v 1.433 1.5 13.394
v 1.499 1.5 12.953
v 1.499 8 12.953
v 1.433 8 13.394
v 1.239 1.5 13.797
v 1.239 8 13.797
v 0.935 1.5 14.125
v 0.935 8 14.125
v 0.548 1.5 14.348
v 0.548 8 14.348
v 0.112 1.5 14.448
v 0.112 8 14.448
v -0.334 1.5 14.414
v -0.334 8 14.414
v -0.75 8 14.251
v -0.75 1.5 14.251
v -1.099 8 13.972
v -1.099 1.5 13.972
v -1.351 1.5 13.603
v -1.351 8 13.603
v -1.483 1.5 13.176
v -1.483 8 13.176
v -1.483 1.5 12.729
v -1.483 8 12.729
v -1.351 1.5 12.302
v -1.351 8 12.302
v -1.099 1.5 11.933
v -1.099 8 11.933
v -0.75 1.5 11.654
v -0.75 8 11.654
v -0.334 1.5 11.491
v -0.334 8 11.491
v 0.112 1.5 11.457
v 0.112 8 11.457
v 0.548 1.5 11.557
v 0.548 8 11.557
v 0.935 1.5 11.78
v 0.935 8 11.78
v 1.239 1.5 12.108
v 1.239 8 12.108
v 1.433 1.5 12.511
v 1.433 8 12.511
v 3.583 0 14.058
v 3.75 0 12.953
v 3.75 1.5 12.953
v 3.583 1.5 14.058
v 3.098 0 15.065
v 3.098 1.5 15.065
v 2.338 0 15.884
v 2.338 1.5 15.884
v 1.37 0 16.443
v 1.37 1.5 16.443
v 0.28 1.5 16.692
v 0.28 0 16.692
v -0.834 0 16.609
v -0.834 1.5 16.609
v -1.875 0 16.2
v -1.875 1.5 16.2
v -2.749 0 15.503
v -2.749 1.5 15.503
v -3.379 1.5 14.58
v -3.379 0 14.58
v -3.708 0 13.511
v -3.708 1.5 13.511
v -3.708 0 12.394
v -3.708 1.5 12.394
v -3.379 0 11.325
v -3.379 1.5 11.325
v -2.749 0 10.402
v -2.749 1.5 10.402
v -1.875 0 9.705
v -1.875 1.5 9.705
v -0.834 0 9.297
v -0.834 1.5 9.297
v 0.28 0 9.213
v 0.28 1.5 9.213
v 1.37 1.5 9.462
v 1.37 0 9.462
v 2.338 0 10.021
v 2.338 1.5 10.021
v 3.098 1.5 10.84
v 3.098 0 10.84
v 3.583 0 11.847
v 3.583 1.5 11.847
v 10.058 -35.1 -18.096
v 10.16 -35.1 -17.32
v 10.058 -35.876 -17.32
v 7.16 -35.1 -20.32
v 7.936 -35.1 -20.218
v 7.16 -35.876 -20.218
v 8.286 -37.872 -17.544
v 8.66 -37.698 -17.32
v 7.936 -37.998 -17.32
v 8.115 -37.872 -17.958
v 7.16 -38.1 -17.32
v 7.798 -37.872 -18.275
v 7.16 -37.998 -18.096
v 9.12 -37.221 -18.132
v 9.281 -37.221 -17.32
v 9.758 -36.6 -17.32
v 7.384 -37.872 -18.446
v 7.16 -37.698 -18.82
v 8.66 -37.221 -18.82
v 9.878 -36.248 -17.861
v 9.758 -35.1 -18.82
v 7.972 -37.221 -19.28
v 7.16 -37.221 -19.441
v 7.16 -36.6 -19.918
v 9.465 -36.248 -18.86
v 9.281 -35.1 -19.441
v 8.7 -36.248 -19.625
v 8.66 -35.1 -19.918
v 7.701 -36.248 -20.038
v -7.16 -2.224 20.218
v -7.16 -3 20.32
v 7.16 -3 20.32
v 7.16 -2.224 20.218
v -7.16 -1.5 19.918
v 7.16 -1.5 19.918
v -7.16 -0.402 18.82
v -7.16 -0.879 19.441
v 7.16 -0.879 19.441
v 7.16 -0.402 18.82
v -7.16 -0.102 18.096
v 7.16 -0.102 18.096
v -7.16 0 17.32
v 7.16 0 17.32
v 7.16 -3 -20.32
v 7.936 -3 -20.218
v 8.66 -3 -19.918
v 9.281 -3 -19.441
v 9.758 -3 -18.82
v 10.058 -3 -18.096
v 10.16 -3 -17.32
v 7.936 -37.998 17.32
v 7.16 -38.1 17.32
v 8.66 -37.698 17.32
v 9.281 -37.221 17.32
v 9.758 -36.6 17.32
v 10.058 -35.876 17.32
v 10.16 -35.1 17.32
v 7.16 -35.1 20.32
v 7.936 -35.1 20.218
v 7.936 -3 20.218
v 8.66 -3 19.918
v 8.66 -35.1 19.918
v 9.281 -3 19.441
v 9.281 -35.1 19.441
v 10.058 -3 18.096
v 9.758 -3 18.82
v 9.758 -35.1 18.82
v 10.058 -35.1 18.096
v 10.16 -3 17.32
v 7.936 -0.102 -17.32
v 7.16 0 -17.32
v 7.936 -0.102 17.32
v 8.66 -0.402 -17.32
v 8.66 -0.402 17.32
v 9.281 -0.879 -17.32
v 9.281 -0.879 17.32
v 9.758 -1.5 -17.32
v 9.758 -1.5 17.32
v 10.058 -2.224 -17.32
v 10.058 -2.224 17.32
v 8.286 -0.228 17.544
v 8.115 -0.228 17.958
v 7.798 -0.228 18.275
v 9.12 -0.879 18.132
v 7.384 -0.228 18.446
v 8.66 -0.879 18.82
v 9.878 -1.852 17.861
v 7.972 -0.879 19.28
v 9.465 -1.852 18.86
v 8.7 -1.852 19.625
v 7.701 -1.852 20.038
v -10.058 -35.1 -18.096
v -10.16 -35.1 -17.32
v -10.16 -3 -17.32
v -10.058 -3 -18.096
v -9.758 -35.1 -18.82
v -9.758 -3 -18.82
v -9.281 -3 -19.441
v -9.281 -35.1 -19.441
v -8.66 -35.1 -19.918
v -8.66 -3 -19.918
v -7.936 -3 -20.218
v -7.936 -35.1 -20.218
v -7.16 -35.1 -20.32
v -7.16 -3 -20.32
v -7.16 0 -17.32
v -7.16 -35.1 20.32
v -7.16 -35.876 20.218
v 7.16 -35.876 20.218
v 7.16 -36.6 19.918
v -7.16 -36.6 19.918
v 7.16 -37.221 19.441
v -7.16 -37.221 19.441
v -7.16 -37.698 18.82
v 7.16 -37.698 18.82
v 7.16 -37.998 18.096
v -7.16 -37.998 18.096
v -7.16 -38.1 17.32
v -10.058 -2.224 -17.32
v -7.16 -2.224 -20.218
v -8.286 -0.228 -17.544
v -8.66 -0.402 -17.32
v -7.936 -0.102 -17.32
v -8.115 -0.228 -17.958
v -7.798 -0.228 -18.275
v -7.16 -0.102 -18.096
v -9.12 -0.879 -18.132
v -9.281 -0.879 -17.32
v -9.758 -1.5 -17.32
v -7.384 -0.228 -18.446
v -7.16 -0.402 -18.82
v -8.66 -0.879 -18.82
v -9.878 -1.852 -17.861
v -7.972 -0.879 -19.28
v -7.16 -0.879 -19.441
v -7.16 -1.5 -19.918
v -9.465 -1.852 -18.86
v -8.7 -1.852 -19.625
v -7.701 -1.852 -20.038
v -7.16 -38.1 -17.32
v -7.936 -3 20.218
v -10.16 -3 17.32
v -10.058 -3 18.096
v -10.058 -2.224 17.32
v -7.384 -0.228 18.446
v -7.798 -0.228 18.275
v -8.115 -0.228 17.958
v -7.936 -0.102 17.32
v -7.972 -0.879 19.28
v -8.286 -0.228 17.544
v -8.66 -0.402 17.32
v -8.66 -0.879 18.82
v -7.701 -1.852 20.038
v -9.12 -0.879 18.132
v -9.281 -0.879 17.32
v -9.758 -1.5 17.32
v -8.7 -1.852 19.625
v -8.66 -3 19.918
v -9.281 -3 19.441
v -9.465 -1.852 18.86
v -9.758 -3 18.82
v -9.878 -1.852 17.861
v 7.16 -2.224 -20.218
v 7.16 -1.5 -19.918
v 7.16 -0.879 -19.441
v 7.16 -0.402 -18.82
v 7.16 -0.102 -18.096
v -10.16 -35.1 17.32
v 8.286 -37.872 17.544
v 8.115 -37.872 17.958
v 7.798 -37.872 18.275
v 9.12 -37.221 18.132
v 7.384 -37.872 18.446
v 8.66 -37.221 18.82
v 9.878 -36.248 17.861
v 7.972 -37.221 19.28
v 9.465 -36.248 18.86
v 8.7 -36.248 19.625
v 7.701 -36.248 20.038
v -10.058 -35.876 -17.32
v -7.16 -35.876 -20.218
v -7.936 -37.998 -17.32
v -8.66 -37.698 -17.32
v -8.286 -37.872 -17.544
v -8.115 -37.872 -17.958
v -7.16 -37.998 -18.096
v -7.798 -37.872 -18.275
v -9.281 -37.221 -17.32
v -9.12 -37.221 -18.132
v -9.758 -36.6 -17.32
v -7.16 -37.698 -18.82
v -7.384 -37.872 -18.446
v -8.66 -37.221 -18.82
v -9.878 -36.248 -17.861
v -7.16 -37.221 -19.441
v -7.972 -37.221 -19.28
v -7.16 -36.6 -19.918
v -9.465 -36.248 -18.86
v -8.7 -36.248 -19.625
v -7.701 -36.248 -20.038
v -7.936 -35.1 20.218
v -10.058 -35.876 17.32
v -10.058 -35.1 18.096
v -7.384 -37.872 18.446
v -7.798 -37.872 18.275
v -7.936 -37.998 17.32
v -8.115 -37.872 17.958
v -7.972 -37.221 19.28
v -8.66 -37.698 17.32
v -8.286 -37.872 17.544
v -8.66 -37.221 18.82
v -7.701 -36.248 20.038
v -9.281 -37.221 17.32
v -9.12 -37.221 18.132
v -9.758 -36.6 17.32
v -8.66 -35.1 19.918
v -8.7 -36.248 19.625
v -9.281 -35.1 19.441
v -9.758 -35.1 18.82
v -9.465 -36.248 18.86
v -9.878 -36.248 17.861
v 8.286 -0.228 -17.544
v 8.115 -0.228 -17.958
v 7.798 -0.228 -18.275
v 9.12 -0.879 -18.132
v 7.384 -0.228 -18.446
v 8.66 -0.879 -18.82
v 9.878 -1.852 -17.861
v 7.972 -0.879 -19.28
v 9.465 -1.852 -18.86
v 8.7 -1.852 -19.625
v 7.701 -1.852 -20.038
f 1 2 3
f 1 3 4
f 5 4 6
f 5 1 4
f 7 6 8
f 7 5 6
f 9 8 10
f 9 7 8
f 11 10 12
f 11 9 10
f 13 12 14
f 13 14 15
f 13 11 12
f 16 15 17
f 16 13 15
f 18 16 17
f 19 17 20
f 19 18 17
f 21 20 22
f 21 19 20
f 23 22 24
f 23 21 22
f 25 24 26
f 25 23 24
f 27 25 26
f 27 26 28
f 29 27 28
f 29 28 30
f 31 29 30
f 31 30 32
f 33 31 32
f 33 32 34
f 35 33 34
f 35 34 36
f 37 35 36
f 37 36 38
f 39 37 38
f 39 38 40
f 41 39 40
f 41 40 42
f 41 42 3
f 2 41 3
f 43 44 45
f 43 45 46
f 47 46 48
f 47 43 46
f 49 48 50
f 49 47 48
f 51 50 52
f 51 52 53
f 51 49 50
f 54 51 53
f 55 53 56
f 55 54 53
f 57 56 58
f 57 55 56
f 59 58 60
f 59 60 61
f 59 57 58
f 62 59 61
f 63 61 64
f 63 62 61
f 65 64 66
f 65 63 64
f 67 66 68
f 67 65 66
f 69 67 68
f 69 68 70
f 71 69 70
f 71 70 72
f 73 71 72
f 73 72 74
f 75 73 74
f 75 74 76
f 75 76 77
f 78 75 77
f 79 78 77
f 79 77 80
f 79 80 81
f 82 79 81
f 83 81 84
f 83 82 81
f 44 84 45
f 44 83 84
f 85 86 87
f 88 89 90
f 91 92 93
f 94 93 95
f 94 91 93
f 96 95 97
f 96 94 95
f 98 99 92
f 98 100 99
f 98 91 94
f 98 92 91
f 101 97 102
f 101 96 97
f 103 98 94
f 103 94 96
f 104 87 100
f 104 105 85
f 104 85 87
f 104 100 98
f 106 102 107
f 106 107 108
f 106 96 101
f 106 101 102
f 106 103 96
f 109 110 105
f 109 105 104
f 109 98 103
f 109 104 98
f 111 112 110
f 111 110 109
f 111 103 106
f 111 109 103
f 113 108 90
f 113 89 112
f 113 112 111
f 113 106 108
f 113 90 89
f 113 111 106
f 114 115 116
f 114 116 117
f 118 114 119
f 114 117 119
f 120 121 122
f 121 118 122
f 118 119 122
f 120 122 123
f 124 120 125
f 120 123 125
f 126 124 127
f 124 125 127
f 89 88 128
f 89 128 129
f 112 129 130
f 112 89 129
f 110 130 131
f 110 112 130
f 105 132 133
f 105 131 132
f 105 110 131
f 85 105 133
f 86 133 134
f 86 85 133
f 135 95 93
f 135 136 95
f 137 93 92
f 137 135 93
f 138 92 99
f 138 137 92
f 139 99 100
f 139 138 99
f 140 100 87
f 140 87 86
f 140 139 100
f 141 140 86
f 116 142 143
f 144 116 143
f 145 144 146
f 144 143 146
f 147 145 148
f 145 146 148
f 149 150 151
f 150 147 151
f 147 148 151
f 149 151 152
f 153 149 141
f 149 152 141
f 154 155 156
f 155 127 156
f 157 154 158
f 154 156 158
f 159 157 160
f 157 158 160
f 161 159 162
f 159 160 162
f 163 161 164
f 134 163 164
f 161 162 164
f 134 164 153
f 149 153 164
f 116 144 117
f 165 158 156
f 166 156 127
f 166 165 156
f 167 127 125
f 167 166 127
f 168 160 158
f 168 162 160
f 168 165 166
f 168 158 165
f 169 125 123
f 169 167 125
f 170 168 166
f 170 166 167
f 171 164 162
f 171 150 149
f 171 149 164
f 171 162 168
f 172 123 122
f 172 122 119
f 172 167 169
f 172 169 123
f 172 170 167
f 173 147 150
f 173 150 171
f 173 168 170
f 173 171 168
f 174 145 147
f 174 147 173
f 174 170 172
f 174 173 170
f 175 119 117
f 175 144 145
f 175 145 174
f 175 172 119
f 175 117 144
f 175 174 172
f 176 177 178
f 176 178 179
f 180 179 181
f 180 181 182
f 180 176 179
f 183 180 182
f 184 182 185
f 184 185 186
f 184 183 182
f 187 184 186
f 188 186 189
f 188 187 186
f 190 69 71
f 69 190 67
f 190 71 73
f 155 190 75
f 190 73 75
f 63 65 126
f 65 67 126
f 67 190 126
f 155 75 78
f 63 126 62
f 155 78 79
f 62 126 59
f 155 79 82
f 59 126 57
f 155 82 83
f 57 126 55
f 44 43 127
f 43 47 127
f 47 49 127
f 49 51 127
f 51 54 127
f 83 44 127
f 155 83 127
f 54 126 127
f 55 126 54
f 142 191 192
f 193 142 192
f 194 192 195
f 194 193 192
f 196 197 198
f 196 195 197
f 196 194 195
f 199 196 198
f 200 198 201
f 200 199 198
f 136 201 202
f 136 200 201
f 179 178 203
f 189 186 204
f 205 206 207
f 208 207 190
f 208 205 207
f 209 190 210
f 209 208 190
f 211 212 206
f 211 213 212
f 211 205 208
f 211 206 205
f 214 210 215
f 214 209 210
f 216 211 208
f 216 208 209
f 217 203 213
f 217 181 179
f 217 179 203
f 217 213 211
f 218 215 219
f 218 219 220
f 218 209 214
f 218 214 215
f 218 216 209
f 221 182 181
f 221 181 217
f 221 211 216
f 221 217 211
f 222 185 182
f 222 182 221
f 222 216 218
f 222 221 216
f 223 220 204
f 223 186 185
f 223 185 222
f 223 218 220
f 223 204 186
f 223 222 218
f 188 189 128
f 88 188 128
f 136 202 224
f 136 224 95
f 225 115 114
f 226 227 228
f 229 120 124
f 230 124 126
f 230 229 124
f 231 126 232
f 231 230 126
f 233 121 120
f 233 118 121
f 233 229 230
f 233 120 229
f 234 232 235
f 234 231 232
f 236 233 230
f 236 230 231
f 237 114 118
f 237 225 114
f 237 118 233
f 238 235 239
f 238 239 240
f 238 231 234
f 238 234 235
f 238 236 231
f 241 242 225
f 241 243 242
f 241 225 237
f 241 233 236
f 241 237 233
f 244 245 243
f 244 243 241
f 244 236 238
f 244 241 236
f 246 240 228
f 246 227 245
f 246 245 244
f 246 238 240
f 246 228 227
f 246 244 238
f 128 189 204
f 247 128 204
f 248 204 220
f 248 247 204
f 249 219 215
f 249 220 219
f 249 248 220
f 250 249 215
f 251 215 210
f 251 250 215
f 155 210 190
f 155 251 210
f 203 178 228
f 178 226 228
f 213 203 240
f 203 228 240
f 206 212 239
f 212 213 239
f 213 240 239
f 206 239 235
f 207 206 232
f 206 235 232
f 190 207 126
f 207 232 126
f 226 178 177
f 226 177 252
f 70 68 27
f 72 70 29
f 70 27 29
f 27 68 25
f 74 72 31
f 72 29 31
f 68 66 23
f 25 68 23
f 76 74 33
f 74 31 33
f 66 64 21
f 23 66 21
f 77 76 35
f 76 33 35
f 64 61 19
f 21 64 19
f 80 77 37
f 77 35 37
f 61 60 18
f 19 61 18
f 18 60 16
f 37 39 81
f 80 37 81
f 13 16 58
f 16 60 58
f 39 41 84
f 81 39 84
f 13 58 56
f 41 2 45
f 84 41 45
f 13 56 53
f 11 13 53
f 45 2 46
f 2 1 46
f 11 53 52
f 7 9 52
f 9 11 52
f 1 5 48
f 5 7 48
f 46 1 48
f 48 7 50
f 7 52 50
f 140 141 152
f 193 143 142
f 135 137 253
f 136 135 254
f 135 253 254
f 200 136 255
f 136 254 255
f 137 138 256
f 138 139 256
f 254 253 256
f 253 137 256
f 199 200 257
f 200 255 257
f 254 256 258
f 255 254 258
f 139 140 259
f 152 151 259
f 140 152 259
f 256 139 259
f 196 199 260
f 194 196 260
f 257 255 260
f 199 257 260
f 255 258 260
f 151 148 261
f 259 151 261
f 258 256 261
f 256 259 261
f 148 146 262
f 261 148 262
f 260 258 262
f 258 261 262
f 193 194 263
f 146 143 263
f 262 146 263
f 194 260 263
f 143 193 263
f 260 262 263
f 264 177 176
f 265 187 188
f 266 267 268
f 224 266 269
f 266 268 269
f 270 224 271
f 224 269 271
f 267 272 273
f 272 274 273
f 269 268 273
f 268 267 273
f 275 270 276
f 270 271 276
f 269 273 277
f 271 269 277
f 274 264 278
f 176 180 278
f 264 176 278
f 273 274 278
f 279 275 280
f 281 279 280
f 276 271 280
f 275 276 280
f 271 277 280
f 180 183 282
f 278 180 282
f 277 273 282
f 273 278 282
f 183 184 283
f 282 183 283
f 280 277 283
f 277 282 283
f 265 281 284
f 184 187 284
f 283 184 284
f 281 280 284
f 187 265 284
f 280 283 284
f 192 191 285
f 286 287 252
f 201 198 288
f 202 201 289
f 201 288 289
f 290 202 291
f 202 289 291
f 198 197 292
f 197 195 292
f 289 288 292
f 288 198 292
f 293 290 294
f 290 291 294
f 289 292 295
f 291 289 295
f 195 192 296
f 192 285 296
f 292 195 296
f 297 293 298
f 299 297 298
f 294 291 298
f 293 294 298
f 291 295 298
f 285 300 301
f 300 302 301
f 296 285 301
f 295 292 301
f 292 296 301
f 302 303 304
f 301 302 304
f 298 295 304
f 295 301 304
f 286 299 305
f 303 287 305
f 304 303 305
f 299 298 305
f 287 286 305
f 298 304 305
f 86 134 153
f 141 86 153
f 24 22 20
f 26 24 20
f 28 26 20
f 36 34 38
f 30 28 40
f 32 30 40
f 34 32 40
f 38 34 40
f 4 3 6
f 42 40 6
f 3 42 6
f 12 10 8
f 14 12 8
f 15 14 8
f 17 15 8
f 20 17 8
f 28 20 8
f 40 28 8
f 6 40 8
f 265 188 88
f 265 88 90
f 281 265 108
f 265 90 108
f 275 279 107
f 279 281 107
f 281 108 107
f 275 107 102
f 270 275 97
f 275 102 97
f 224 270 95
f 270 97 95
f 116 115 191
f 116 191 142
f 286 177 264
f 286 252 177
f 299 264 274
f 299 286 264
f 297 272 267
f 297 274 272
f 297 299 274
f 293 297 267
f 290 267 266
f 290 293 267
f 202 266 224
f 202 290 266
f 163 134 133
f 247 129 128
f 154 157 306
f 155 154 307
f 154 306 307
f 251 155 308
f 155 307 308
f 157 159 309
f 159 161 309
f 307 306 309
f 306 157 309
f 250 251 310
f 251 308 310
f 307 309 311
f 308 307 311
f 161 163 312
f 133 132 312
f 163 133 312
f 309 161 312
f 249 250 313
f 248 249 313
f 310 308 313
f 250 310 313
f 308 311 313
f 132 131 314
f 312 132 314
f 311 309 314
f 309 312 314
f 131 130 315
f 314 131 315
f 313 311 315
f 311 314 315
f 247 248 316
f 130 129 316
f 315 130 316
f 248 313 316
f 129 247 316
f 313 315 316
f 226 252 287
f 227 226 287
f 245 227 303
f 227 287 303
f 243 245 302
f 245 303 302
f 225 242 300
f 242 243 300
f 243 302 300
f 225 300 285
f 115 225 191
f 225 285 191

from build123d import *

# Parameters (mm, degrees)
F0_W     = 20.32
F0_H     = 40.64
F0_R     = 3.75
F0_R_2   = 1.499247
F1_DEPTH = 38.1
F2_DEPTH = 1.5
F3_R     = 3
F4_DEPTH = 8


with BuildPart() as f1:
    # F0 (on Front) → F1 (new body)
    with BuildSketch(Plane.XZ):
        Rectangle(F0_W, F0_H)
        with Locations((0, 12.952523)):
            Circle(F0_R, mode=Mode.SUBTRACT)
        with Locations((0, 12.952523)):
            Circle(F0_R)
        with Locations((0, 12.952523)):
            Circle(F0_R_2, mode=Mode.SUBTRACT)
        with Locations((0, 12.952523)):
            Circle(F0_R_2)
    extrude(amount=F1_DEPTH)

    # F0 (on Front) → F2 (join)
    with BuildSketch(Plane.XZ):
        with Locations((0, 12.952523)):
            Circle(F0_R)
        with Locations((0, 12.952523)):
            Circle(F0_R_2, mode=Mode.SUBTRACT)
    extrude(amount=-F2_DEPTH)

    # F3
    f3_edges = [f1.edges().sort_by_distance(p)[0] for p in [
        (10.16, -19.05, -20.32),
        (10.16, -19.05, 20.32),
        (10.16, 0, 0),
        (10.16, -38.1, 0),
        (-10.16, -19.05, 20.32),
        (0, 0, 20.32),
        (0, -38.1, 20.32),
        (-10.16, -19.05, -20.32),
        (-10.16, 0, 0),
        (-10.16, -38.1, 0),
        (0, -38.1, -20.32),
        (0, 0, -20.32),
    ]]
    fillet(f3_edges, radius=F3_R)

    # F0 (on Front) → F4 (join)
    with BuildSketch(Plane.XZ):
        with Locations((0, 12.952523)):
            Circle(F0_R_2)
    extrude(amount=-F4_DEPTH)


solid = f1.part
